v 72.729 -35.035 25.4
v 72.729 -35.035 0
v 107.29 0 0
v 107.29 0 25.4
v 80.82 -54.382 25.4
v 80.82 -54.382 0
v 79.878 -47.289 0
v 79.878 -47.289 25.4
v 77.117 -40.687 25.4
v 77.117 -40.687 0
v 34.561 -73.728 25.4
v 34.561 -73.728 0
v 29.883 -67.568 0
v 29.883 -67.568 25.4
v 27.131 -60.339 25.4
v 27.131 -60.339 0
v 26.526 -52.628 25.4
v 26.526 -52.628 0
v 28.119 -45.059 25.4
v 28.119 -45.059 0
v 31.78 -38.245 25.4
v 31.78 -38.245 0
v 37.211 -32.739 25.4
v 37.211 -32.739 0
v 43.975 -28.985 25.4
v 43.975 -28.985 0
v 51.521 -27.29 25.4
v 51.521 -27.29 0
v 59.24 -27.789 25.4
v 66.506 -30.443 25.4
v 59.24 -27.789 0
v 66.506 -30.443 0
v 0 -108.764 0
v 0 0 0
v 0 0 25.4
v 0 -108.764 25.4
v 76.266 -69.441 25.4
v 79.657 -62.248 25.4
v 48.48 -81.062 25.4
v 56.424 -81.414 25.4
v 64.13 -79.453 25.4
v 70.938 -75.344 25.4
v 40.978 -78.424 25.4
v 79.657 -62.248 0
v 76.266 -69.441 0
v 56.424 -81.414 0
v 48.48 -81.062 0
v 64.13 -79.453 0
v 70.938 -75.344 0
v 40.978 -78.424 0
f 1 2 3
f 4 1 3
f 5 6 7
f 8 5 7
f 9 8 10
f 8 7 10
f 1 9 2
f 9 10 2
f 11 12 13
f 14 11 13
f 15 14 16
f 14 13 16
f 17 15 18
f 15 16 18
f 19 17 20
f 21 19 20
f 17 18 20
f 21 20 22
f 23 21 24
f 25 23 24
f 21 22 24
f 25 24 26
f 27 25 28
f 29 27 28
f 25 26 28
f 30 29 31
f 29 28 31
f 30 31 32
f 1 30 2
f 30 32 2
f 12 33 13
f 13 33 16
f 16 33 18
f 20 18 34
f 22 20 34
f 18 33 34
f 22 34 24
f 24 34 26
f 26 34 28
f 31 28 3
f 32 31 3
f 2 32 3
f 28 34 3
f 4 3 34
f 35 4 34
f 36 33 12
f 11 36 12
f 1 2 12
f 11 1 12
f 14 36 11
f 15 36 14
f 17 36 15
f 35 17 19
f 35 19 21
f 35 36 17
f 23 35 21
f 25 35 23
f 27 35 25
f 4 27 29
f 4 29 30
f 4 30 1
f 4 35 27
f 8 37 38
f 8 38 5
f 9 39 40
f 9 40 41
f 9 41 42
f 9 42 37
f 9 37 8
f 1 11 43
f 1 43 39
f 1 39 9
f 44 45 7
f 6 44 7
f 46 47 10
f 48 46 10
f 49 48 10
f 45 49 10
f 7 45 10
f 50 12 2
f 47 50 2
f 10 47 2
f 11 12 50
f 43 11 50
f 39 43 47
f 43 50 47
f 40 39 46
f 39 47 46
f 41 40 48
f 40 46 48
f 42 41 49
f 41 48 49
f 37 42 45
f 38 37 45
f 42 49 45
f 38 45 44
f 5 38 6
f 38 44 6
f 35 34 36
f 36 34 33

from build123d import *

# Parameters (mm, degrees)
F1_DEPTH = 25.4


with BuildPart() as f1:
    # F0 (on Top) → F1 (new body)
    with BuildSketch(Plane.XY):
        with BuildLine():
            Line((107.2898805141, 0), (0, 0))
            Line((0, 0), (0, -108.7636202574))
            Line((0, -108.7636202574), (34.5607594065, -73.7281323448))
            ThreePointArc((34.5607594065, -73.7281323448), (34.298618041, -35.2976292781), (72.7291211076, -35.0354879126))
            Line((72.7291211076, -35.0354879126), (107.2898805141, 0))
        make_face()
    extrude(amount=F1_DEPTH)


with BuildPart() as f1b:
    # F0 (on Top) → F1, piece 2 (new body)
    with BuildSketch(Plane.XY):
        with BuildLine():
            ThreePointArc((80.8200417661, -54.3818101287), (78.7158466413, -43.8967829424), (72.7291211076, -35.0354879126))
            Line((72.7291211076, -35.0354879126), (34.5607594065, -73.7281323448))
            ThreePointArc((34.5607594065, -73.7281323448), (64.1299674434, -79.4527165129), (80.8200417661, -54.3818101287))
        make_face()
    extrude(amount=F1_DEPTH)


solid = Compound([f1.part, f1b.part])
